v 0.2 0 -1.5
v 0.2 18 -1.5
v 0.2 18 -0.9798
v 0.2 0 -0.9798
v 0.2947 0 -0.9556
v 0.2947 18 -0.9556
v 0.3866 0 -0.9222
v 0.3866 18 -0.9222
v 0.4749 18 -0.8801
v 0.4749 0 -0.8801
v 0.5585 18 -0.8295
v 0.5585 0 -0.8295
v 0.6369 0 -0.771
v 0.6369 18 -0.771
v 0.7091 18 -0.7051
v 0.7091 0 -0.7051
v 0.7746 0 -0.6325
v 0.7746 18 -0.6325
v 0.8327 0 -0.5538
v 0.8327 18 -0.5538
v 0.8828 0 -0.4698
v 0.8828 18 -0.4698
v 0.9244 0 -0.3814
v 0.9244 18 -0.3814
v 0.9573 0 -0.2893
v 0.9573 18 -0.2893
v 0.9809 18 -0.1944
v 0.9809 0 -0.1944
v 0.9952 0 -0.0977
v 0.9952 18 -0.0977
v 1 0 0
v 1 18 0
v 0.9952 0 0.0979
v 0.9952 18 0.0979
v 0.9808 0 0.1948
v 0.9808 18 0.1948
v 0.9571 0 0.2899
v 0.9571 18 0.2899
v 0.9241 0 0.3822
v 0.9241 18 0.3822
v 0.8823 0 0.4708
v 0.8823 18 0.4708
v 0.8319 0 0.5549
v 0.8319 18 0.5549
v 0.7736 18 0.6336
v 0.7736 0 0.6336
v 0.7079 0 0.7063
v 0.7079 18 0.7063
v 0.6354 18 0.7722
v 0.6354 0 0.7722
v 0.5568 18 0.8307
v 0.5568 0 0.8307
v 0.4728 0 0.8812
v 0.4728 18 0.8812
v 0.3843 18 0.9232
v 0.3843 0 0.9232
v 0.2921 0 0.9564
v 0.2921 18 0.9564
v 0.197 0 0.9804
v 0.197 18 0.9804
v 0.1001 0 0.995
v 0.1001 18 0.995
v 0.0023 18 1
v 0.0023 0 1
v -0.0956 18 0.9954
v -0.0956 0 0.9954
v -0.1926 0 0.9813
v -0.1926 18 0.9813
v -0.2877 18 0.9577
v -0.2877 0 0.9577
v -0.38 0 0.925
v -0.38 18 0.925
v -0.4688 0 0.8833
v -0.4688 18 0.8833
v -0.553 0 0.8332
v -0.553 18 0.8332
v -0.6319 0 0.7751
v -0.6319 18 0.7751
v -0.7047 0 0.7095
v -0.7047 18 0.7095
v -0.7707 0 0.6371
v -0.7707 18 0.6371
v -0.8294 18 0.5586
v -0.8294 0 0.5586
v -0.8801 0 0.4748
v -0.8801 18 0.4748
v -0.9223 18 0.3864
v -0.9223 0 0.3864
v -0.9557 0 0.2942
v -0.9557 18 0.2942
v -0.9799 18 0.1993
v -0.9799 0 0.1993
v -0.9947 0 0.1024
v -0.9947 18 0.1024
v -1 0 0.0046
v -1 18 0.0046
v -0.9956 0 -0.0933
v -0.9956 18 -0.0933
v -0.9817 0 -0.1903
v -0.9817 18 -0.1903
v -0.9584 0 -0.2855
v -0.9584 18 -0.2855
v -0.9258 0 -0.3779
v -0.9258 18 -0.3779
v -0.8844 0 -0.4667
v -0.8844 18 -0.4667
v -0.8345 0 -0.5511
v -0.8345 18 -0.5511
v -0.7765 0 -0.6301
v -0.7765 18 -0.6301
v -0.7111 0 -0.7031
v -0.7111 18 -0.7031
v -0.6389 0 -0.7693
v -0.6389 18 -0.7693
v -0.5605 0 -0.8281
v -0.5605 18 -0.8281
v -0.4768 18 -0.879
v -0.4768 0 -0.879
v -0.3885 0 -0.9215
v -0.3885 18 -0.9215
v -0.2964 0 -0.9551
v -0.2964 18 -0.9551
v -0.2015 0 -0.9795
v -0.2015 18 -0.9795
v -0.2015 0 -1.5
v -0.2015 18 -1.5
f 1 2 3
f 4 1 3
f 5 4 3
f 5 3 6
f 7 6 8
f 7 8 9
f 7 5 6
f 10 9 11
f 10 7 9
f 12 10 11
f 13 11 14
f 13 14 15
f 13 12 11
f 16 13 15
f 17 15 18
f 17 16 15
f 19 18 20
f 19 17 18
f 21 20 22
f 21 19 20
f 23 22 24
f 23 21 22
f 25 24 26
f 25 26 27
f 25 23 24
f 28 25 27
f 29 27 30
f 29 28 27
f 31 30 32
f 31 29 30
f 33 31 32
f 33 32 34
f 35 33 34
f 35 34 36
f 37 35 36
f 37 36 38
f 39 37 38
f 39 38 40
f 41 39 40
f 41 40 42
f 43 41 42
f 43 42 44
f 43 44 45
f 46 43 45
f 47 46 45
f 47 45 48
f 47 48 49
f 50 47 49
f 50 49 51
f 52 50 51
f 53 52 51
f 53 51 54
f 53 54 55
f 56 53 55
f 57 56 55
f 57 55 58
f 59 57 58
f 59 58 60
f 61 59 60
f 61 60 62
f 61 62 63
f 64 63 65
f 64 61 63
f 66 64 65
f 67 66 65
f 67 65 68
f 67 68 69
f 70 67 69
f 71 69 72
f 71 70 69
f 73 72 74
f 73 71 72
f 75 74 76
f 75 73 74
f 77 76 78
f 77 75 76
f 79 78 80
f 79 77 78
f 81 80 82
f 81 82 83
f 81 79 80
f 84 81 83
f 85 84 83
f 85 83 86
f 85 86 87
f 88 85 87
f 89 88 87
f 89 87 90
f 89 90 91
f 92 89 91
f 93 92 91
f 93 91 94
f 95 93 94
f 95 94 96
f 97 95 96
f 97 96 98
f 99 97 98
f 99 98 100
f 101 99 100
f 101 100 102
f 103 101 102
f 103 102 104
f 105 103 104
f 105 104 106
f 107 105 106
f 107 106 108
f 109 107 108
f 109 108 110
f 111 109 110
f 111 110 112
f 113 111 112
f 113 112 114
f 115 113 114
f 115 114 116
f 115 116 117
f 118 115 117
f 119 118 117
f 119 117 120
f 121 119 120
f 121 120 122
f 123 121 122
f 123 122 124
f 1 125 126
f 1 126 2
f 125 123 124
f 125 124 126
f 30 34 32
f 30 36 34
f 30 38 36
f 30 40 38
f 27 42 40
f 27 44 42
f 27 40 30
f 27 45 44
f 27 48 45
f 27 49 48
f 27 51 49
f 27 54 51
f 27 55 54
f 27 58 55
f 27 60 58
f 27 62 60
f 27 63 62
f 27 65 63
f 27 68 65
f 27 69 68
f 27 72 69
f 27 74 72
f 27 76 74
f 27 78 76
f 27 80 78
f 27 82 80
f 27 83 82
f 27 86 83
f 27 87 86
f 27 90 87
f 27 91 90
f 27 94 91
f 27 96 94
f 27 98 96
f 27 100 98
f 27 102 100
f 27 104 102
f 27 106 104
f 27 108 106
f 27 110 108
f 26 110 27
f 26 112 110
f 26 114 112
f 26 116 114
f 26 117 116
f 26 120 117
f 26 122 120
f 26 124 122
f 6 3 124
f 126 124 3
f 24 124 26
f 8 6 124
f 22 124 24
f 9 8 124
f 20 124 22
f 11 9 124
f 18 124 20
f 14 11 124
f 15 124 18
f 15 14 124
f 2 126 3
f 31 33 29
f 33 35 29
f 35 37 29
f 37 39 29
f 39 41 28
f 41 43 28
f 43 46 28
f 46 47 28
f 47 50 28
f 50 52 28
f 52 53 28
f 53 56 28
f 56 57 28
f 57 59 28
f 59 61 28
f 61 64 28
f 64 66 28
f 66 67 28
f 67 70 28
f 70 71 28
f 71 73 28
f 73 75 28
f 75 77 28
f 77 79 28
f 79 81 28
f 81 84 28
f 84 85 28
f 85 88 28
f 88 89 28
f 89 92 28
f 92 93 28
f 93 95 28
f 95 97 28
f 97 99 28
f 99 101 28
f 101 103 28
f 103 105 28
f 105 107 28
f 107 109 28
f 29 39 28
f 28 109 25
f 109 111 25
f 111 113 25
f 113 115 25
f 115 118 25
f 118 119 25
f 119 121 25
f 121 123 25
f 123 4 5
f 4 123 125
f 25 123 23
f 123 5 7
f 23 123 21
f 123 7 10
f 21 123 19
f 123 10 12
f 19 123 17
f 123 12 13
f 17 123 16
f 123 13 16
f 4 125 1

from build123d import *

# Parameters (mm, degrees)
SKETCH1_R           = 2
BOSS_EXTRUDE1_DEPTH = 45
CUT_EXTRUDE1_START  = -53
SKETCH2_R           = 4.181773236
CUT_EXTRUDE1_DEPTH  = 53
SKETCH3_R           = 2.328270144
CUT_EXTRUDE2_DEPTH  = 27


with BuildPart() as part:
    # Sketch1 → Boss-Extrude1 (new body)
    with BuildSketch(Plane(origin=(0, 0, 0), x_dir=(1, 0, 0), z_dir=(0, 1, 0))):
        Polygon((-0.5, 1.936491673), (0, 2.368245837), (0, 2.8), (-0.5, 2.8), align=None)
        Polygon((0, 2.8), (0, 2.368245837), (0.5, 2.8), align=None)
        with BuildLine():
            Line((0, 2.368245837), (0, 2))
            ThreePointArc((0, 2), (0.252008585, 1.984059393), (0.5, 1.936491673))
            Line((0.5, 1.936491673), (0.5, 2.8))
            Line((0.5, 2.8), (0, 2.368245837))
        make_face()
        with BuildLine():
            ThreePointArc((-0.5, 1.936491673), (-0.252008585, 1.984059393), (0, 2))
            Line((0, 2), (0, 2.368245837))
            Line((0, 2.368245837), (-0.5, 1.936491673))
        make_face()
        Circle(SKETCH1_R)
    extrude(amount=BOSS_EXTRUDE1_DEPTH)

    # Sketch2 → Cut-Extrude1 (cut)
    # profile 1 of 2: a face of its own
    with BuildSketch(Plane(origin=(0, 45, 0), x_dir=(1, 0, 0), z_dir=(0, 1, 0)).offset(CUT_EXTRUDE1_START)):
        Circle(SKETCH2_R)
        with BuildLine():
            Line((-0.5, 2.8), (-0.5, 1.936491673))
            ThreePointArc((-0.5, 1.936491673), (0, -2), (0.5, 1.936491673))
            Line((0.5, 1.936491673), (0.5, 2.8))
            Line((0.5, 2.8), (-0.5, 2.8))
        make_face(mode=Mode.SUBTRACT)
    # profile 2 of 2: a face of its own
    with BuildSketch(Plane(origin=(0, 45, 0), x_dir=(1, 0, 0), z_dir=(0, 1, 0)).offset(CUT_EXTRUDE1_START)):
        with BuildLine():
            Line((0.5, 2.8), (-0.5, 2.8))
            Line((-0.5, 2.8), (-0.5, 1.936491673))
            ThreePointArc((-0.5, 1.936491673), (0, -2), (0.5, 1.936491673))
            Line((0.5, 1.936491673), (0.5, 2.8))
        make_face()
        with BuildLine():
            Line((-0.20151518, 1.5), (0, 1.5))
            Line((0, 1.5), (0.2, 1.5))
            Line((0.2, 1.5), (0.2, 0.979795897))
            ThreePointArc((0.2, 0.979795897), (0.774596669, 0.632455532), (1, 0))
            ThreePointArc((1, 0), (-0.631856321, -0.775085537), (-0.20151518, 0.979485391))
            Line((-0.20151518, 0.979485391), (-0.20151518, 1.5))
        make_face(mode=Mode.SUBTRACT)
    extrude(amount=CUT_EXTRUDE1_DEPTH, mode=Mode.SUBTRACT)

    # Sketch3 → Cut-Extrude2 (cut)
    with BuildSketch(Plane(origin=(0, 45, 0), x_dir=(1, 0, 0), z_dir=(0, 1, 0))):
        Circle(SKETCH3_R)
    extrude(amount=-CUT_EXTRUDE2_DEPTH, mode=Mode.SUBTRACT)


solid = part.part
